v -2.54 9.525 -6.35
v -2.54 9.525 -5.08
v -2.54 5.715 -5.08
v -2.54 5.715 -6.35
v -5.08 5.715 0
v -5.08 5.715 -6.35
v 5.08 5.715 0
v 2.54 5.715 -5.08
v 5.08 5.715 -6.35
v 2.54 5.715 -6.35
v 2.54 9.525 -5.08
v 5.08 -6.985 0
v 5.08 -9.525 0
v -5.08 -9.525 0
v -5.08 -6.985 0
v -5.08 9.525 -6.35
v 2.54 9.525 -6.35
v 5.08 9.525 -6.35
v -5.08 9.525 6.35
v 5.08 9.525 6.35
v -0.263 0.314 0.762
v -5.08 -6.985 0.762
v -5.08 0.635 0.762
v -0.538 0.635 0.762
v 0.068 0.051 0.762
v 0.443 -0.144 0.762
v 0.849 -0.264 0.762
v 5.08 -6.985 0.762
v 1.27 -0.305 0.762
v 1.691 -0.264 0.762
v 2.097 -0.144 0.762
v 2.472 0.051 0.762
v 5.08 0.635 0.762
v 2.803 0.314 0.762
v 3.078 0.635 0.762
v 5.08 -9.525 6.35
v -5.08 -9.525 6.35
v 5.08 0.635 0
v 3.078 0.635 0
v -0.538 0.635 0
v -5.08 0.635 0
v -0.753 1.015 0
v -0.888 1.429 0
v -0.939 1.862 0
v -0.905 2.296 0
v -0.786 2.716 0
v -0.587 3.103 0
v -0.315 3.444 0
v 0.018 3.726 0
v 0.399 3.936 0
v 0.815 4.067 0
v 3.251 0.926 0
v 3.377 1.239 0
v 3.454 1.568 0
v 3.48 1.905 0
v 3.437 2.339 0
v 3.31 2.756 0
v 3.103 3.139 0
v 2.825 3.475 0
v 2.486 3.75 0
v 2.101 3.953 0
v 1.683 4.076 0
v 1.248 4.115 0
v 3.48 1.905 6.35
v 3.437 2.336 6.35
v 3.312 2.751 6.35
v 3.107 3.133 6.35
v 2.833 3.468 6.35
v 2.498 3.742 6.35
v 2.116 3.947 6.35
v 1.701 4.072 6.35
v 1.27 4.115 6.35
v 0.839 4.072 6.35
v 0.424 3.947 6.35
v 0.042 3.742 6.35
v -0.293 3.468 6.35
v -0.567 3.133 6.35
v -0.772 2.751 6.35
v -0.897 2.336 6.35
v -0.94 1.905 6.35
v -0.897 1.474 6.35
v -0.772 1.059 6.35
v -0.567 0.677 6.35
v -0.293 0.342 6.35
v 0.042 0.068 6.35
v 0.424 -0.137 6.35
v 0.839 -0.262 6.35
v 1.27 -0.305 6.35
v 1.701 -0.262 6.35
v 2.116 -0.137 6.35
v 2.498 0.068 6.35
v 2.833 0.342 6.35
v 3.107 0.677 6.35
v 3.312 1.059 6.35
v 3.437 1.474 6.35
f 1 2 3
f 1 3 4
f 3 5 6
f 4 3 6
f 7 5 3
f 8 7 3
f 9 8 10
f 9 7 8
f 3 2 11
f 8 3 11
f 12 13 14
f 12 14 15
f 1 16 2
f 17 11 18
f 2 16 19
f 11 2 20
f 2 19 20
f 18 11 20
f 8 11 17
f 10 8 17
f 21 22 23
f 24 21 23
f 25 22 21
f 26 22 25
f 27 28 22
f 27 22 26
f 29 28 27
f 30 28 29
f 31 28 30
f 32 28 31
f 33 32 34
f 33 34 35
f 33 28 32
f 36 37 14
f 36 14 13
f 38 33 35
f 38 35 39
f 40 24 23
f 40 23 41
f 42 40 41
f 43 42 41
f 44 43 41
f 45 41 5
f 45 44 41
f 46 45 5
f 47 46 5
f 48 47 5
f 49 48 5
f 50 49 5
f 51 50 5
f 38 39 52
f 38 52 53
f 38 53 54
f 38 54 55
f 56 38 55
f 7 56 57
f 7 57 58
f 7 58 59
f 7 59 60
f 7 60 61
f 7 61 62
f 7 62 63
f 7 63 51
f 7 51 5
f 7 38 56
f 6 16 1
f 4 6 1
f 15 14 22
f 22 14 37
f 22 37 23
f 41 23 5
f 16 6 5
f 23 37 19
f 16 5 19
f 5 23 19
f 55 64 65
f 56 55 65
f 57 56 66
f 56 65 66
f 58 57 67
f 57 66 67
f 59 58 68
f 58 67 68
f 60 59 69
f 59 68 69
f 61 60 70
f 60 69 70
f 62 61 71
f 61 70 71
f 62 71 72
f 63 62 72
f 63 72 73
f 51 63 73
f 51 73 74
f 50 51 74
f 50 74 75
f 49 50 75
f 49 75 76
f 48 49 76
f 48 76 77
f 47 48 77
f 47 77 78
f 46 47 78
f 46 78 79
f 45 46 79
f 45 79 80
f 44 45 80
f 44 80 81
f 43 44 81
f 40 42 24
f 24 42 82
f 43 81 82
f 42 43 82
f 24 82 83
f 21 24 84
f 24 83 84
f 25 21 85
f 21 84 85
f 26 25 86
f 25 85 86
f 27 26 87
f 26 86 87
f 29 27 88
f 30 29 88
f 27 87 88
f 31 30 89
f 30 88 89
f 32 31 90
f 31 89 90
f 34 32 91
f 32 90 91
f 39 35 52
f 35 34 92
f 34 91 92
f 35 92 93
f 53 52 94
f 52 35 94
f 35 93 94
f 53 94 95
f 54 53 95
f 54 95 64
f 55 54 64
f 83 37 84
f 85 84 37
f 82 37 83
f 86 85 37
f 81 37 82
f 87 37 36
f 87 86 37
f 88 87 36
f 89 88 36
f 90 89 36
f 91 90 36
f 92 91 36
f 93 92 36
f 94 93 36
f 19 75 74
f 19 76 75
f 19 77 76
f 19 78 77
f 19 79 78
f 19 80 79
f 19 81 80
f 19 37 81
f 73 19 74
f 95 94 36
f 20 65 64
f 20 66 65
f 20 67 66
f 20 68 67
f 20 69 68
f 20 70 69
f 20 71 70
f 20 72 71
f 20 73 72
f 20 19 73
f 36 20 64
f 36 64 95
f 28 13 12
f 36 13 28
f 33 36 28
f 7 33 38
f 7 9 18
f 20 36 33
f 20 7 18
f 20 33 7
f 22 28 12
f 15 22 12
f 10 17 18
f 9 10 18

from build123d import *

# Parameters (mm, degrees)
SKETCH1_W           = 10.16
SKETCH1_H           = 19.05
BOSS_EXTRUDE1_DEPTH = 6.35
SKETCH2_W           = 6.35
SKETCH2_H           = 15.24
CUT_EXTRUDE1_DEPTH  = 11.16
SKETCH3_W           = 5.08
SKETCH3_H           = 1.27
CUT_EXTRUDE2_DEPTH  = 20.05
SKETCH4_W           = 0.762
SKETCH4_H           = 7.62
CUT_EXTRUDE3_DEPTH  = 11.16
SKETCH5_R           = 2.2098
CUT_EXTRUDE4_DEPTH  = 13.7


with BuildPart() as part:
    # Sketch1 → Boss-Extrude1 (new body, symmetric)
    with BuildSketch(Plane.XY):
        Rectangle(SKETCH1_W, SKETCH1_H)
    extrude(amount=BOSS_EXTRUDE1_DEPTH, both=True)

    # Sketch2 → Cut-Extrude1 (cut, through all)
    with BuildSketch(Plane(origin=(5.08, 0, 0), x_dir=(0, 0, -1), z_dir=(1, 0, 0))):
        with Locations((3.175, -1.905)):
            Rectangle(SKETCH2_W, SKETCH2_H)
    extrude(amount=-CUT_EXTRUDE1_DEPTH, mode=Mode.SUBTRACT)

    # Sketch3 → Cut-Extrude2 (cut, through all)
    with BuildSketch(Plane(origin=(0, 9.525, 0), x_dir=(1, 0, 0), z_dir=(0, 1, 0))):
        with Locations((0, 5.715)):
            Rectangle(SKETCH3_W, SKETCH3_H)
    extrude(amount=-CUT_EXTRUDE2_DEPTH, mode=Mode.SUBTRACT)

    # Sketch4 → Cut-Extrude3 (cut, through all)
    with BuildSketch(Plane(origin=(5.08, 0, 0), x_dir=(0, 0, -1), z_dir=(1, 0, 0))):
        with Locations((-0.381, -3.175)):
            Rectangle(SKETCH4_W, SKETCH4_H)
    extrude(amount=-CUT_EXTRUDE3_DEPTH, mode=Mode.SUBTRACT)

    # Sketch5 → Cut-Extrude4 (cut, through all)
    with BuildSketch(Plane.XY.offset(6.35)):
        with Locations((1.27, 1.905)):
            Circle(SKETCH5_R)
    extrude(amount=-CUT_EXTRUDE4_DEPTH, mode=Mode.SUBTRACT)


solid = part.part
